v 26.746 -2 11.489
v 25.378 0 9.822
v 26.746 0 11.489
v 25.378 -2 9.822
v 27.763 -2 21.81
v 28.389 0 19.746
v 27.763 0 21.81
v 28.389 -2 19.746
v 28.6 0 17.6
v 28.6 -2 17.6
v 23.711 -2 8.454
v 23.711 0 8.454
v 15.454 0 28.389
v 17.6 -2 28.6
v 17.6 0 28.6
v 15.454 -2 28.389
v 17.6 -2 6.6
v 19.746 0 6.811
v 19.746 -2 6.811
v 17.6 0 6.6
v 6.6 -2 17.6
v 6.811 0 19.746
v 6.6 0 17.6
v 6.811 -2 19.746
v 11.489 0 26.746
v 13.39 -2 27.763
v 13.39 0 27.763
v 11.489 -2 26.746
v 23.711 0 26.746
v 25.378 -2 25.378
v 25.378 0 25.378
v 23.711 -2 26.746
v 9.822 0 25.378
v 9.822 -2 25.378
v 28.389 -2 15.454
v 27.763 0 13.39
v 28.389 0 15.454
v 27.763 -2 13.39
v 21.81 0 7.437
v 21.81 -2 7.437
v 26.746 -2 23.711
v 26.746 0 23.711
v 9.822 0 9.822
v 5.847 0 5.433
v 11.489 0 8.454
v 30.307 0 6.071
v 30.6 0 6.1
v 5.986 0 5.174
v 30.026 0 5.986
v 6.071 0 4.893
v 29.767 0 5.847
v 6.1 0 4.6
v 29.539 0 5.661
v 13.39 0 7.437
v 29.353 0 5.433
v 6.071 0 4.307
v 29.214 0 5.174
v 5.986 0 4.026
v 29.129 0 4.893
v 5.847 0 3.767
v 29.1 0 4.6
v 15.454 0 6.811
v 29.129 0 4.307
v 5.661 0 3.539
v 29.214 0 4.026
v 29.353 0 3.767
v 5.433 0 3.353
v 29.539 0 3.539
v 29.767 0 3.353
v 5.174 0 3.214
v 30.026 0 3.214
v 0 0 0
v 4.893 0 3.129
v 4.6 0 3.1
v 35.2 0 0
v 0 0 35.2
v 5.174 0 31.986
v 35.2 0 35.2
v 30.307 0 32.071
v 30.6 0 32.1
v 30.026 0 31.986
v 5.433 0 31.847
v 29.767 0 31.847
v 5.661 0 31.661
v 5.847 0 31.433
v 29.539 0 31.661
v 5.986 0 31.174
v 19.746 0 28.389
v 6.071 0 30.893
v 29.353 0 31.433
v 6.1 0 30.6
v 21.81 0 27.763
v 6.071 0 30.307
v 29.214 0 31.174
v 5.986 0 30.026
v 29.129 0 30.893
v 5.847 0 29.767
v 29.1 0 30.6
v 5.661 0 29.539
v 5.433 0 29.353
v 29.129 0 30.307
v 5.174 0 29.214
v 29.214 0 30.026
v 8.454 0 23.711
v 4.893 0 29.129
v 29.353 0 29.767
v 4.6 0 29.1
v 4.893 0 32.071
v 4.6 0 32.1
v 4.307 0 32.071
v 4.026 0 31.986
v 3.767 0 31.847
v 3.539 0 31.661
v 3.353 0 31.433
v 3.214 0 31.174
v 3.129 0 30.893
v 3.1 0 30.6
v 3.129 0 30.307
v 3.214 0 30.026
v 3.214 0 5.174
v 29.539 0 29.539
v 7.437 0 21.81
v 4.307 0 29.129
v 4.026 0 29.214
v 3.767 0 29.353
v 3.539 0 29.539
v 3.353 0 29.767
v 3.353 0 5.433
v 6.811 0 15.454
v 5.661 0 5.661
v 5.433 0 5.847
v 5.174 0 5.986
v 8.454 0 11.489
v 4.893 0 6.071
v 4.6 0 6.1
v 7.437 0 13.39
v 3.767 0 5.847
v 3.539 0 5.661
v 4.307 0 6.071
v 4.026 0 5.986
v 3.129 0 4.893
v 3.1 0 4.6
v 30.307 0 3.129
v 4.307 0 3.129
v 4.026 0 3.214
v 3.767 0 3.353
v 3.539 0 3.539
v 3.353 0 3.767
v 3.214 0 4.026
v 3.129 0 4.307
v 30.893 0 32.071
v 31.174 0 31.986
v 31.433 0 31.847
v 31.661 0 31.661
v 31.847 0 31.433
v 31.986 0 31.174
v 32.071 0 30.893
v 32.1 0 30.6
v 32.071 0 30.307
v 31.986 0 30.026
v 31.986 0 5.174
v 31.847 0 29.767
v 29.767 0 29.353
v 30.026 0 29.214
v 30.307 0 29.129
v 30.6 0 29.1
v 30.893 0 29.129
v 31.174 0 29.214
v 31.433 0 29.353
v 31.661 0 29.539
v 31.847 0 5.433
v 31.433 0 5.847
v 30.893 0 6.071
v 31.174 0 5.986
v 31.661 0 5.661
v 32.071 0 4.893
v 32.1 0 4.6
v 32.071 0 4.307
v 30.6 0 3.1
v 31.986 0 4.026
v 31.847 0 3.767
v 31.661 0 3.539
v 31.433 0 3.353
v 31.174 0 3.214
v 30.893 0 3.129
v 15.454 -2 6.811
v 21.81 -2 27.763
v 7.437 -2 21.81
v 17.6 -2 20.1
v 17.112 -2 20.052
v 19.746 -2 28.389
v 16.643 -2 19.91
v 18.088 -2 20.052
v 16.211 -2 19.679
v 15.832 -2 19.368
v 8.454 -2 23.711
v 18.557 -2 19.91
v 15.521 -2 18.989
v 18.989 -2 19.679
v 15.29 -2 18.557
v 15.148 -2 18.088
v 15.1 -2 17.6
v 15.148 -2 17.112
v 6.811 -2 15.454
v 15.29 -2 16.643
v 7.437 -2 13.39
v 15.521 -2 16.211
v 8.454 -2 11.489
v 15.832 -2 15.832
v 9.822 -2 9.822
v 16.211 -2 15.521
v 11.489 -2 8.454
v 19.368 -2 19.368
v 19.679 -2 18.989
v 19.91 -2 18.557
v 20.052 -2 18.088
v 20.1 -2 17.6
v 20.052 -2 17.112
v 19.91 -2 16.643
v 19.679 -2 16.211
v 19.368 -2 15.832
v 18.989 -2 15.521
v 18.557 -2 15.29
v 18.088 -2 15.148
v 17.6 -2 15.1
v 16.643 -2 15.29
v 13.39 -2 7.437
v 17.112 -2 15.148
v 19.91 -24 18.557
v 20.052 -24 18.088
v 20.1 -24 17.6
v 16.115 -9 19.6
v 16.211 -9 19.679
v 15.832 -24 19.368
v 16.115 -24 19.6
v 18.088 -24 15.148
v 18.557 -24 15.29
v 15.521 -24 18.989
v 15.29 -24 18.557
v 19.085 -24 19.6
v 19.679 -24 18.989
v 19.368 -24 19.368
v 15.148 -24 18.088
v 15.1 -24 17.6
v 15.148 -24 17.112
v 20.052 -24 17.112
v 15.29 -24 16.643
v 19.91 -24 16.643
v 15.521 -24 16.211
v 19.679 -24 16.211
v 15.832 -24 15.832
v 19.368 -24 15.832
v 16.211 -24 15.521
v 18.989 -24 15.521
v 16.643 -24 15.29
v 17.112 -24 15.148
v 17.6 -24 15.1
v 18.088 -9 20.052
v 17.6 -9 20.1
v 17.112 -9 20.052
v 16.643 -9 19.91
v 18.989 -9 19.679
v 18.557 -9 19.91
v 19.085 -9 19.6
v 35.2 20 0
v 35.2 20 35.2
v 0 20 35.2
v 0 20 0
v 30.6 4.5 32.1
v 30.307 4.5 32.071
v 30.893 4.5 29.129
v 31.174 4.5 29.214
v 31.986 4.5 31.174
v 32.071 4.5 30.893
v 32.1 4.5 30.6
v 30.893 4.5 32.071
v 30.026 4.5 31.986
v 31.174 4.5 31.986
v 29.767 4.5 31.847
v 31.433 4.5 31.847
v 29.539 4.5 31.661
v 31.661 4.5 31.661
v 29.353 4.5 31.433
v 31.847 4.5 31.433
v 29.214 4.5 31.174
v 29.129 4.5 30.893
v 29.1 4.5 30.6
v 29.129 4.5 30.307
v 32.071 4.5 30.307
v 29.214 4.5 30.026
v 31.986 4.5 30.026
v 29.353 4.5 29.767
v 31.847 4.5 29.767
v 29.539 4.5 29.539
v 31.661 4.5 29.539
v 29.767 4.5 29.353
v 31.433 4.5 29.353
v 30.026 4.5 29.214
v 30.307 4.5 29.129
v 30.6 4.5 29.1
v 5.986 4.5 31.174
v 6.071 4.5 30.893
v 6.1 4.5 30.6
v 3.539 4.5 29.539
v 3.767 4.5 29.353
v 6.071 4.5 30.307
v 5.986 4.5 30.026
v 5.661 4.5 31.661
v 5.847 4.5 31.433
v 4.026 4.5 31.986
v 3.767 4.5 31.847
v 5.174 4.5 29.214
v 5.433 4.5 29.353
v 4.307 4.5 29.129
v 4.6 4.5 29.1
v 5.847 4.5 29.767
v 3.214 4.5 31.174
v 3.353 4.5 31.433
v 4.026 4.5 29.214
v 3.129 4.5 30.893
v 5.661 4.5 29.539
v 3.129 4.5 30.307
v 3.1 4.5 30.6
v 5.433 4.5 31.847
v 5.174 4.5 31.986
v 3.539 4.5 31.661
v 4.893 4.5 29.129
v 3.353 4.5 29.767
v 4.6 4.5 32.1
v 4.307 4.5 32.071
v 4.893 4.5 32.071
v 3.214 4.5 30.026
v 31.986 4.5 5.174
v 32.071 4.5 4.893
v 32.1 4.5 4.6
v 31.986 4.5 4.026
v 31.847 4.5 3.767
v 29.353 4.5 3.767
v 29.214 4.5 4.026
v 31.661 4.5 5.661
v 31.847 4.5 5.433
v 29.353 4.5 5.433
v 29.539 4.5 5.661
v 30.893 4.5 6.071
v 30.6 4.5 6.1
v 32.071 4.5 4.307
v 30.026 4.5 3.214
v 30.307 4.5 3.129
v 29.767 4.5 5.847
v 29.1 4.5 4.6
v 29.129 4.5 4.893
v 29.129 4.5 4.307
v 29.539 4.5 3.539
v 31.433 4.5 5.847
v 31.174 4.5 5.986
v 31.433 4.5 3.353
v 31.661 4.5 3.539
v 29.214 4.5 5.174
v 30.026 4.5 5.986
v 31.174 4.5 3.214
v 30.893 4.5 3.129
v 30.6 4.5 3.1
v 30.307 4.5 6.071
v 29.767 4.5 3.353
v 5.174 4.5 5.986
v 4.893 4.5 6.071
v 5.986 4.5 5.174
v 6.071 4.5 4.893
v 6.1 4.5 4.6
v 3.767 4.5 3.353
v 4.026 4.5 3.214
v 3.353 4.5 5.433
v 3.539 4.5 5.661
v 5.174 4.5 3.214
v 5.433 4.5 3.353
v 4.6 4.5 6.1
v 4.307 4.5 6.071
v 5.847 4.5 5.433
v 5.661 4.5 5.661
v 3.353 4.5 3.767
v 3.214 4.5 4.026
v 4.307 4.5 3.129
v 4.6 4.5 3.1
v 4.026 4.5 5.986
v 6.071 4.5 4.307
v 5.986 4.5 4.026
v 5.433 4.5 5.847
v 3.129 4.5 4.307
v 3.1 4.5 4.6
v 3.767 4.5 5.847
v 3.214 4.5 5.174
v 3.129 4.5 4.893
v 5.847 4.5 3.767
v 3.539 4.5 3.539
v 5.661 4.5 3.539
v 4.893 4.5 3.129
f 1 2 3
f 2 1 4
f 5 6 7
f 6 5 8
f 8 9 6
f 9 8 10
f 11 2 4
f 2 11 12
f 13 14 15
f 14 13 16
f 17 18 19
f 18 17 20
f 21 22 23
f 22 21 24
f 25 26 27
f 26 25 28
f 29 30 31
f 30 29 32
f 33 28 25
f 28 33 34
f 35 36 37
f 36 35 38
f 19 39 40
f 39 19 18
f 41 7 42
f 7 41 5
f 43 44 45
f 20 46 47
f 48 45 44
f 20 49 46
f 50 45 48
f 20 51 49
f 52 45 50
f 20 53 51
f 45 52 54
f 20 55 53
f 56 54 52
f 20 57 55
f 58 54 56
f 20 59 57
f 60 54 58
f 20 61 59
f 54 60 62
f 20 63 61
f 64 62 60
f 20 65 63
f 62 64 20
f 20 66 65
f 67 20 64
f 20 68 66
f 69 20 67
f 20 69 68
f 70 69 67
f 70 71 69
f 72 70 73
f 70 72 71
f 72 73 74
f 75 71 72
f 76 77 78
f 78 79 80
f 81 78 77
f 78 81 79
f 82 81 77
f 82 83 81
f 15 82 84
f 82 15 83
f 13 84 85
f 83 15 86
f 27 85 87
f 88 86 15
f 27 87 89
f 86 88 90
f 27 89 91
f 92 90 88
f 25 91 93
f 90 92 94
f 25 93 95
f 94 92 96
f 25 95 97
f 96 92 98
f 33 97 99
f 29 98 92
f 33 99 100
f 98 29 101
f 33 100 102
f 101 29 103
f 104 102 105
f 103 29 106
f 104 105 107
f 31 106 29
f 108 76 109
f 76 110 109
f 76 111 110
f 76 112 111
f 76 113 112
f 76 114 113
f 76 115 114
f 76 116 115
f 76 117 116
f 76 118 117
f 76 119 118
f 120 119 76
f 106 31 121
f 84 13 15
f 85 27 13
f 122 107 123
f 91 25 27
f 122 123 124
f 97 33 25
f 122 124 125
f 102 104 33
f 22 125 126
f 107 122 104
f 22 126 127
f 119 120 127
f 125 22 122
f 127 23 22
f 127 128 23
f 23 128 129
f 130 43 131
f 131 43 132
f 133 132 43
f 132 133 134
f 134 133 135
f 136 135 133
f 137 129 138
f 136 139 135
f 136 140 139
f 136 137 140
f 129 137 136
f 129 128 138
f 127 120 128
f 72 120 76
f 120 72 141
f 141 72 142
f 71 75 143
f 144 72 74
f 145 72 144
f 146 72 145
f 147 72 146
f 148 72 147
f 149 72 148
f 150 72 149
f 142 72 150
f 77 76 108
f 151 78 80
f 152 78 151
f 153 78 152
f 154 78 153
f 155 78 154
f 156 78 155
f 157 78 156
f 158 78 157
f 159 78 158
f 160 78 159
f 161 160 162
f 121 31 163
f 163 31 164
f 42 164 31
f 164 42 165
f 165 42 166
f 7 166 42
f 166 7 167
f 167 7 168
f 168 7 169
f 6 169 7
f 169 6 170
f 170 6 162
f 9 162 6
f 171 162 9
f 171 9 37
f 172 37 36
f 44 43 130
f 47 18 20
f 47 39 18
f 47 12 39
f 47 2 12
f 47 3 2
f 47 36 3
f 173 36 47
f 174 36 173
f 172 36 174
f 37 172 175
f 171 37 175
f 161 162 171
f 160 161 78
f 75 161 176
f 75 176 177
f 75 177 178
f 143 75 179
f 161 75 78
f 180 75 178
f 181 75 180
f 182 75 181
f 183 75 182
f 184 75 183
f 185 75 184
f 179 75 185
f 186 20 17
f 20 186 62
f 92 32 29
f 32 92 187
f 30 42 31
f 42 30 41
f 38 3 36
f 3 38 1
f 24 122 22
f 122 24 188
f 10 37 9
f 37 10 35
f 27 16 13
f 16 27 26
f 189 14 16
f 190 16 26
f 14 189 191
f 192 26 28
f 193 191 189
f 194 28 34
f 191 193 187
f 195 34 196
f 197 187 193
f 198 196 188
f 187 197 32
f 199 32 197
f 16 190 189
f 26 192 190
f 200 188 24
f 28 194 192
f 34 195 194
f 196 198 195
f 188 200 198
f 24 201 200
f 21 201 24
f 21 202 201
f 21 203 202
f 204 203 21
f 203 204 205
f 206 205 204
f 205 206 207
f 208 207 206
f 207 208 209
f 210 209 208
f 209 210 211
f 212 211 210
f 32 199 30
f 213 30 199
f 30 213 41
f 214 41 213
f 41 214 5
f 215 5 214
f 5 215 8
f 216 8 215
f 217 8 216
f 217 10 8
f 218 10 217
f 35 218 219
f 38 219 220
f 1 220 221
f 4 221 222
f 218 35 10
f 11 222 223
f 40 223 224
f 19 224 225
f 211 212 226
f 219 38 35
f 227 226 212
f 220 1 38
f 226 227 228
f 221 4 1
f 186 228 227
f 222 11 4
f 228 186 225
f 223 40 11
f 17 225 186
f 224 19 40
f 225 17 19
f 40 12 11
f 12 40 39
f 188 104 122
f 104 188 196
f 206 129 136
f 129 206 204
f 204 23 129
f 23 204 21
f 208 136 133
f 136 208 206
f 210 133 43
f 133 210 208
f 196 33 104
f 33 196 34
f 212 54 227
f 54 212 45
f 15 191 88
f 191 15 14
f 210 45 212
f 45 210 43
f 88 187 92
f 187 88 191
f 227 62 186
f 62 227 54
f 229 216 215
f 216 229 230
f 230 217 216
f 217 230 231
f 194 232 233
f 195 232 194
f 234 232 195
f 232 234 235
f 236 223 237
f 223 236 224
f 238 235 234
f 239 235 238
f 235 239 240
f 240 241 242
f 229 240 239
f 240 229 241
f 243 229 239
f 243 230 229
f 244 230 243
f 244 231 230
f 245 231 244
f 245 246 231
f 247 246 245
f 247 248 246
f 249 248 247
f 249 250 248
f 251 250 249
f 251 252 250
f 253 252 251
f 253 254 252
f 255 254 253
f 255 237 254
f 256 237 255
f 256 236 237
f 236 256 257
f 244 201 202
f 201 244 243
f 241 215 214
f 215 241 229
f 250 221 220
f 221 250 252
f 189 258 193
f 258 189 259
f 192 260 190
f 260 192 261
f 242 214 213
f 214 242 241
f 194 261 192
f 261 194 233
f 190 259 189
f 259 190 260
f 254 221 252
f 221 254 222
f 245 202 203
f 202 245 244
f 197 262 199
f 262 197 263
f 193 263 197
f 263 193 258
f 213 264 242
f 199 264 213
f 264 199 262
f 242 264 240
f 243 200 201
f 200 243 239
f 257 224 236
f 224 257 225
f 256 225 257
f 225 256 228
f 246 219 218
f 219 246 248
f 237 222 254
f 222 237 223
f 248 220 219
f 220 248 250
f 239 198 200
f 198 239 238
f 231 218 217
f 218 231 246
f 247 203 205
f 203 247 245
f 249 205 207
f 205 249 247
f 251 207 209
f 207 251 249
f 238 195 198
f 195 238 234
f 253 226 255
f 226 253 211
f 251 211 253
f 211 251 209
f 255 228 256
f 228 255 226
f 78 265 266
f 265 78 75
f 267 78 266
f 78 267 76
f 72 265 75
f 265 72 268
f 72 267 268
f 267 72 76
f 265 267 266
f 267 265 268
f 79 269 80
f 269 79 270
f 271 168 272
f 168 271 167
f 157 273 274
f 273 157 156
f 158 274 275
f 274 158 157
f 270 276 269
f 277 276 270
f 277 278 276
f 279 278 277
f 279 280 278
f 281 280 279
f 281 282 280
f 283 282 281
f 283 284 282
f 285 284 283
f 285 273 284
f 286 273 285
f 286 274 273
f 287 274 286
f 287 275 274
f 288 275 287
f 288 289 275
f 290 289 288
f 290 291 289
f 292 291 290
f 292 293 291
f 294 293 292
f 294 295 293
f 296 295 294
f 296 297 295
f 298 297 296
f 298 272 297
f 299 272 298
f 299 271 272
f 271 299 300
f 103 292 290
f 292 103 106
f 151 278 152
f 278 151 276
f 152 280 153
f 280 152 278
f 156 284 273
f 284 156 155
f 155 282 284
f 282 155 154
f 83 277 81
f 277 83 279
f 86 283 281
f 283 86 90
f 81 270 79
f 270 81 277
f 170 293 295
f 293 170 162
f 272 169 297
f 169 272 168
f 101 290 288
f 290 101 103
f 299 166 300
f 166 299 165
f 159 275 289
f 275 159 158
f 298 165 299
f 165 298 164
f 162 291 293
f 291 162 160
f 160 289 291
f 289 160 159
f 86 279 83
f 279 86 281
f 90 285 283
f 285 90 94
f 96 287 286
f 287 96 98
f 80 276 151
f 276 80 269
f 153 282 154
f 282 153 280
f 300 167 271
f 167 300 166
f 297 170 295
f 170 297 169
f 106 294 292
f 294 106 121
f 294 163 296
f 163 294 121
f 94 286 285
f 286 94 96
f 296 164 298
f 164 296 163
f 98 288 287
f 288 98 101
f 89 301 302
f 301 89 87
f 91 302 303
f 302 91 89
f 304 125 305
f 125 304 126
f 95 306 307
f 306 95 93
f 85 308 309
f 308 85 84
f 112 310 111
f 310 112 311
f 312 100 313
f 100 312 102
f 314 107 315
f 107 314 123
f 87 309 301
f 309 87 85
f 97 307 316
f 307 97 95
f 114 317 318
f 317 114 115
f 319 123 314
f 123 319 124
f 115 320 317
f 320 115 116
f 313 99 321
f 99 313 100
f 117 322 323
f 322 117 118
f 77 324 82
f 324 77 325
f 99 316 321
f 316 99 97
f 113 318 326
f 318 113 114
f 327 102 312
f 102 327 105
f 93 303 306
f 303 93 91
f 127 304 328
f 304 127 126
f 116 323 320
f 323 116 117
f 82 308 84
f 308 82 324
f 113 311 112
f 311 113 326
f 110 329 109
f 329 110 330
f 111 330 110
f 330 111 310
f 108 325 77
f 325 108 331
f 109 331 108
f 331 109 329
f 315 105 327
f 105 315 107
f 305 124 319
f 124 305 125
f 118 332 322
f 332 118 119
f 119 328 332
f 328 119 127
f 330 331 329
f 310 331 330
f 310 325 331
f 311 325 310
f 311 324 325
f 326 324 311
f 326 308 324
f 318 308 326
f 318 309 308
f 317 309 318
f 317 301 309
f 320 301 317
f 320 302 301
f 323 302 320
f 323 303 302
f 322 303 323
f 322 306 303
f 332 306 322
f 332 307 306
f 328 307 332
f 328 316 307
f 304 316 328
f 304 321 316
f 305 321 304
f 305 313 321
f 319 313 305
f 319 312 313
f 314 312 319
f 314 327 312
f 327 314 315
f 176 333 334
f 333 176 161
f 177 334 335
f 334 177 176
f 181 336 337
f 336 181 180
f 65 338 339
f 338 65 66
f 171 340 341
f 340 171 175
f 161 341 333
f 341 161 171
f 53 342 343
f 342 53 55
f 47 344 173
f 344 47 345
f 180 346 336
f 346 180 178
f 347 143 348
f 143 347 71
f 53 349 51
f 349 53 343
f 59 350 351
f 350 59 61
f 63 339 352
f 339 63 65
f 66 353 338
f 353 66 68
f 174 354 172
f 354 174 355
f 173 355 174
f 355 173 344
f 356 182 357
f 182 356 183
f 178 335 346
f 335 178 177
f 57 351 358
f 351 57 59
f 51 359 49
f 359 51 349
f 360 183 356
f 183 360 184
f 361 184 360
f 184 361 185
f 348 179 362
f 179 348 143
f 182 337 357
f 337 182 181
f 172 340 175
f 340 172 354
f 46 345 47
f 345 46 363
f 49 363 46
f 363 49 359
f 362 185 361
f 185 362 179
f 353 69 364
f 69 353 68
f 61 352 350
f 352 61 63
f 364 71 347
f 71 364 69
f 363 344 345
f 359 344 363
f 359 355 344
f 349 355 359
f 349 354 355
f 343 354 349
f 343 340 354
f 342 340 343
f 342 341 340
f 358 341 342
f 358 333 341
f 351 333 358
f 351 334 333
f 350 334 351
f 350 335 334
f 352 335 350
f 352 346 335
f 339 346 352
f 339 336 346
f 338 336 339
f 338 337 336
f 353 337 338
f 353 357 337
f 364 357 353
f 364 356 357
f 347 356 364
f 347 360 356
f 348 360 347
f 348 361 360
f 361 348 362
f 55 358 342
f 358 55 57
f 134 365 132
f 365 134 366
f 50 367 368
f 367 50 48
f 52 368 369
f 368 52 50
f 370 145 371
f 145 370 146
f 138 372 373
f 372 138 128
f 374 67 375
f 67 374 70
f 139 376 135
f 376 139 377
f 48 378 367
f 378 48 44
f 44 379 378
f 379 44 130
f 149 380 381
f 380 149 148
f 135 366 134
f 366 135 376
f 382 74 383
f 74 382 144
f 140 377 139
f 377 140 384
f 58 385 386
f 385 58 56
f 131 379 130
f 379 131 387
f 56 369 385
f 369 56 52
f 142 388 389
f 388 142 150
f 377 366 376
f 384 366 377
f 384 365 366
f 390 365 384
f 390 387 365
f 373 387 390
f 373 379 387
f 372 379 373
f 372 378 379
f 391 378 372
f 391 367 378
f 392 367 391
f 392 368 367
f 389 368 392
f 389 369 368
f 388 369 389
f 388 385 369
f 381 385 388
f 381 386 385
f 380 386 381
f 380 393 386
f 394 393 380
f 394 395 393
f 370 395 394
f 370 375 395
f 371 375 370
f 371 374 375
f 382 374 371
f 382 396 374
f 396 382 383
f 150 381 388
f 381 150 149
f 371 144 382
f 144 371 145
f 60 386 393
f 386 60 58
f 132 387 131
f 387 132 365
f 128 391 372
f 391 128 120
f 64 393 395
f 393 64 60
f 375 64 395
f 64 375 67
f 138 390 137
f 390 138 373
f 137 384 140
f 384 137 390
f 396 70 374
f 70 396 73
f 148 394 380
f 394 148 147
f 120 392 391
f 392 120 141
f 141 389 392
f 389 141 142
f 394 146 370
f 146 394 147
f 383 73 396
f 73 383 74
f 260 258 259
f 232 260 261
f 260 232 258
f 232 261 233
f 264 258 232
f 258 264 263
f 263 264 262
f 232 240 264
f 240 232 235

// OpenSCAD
// WeePrusa
// Stepper Motors
// GNU GPL v3
// Thomas Phillips (tntexplosivesltd@gmail.com)
// https://github.com/tntexplosivesltd/WeePrusa

$fn = 32;

// Colours
black = [12/255, 12/255, 12/255];
grey = [200/255, 200/255, 200/255];

// Motor back
width = 35.2;
torque = 4;

// Shaft
shaft = 24;
shaft_radius = 2.5;
keyway = 15;
hub_radius = 11;
hub_width = 2;

// Screws
screw_size = 3;
screw_depth = 4.5;
screw_separation = 26;

function get_length(t) = lookup(t, [
			[4, 20],
			[6.5, 26],
			[7, 28],
			[12.5, 28],
			[10, 26],
			[14, 26],
			[18, 34],
			[18.5, 41],
			[23, 42],
			[40, 52],
	]);

length = get_length(torque);

difference()
{
	union()
	{
		color (black) cube ([width, length, width], center = false);
		color (grey)
		{
			translate ([width/2, 0, width/2])
			{
				rotate ([90,0,0]) cylinder (h = hub_width, r1 = hub_radius, r2 = hub_radius, center = false);
				rotate ([90,0,0]) cylinder (h = shaft, r1 = shaft_radius, r2 = shaft_radius, center = false);
			}
		}
	}
	
	color (grey)
	{
		translate([width/2, screw_depth, width/2])
		{
			// screw holes
			translate ([screw_separation/2, 0, screw_separation/2]) rotate ([90,0,0])
				cylinder (h = screw_depth+1, r1 = screw_size/2, r2 = screw_size/2, center = false);
			translate ([-screw_separation/2, 0, screw_separation/2]) rotate ([90,0,0])
				cylinder (h = screw_depth+1, r1 = screw_size/2, r2 = screw_size/2, center = false);
			translate ([screw_separation/2, 0, -screw_separation/2]) rotate ([90,0,0])
				cylinder (h = screw_depth+1, r1 = screw_size/2, r2 = screw_size/2, center = false);
			translate ([-screw_separation/2, 0, -screw_separation/2]) rotate ([90,0,0])
				cylinder (h = screw_depth+1, r1 = screw_size/2, r2 = screw_size/2, center = false);

			// flat on shaft
			rotate ([90,0,0]) translate ([-shaft_radius, shaft_radius-0.5, shaft+screw_depth-keyway]) 
				cube ([5, 0.5, keyway+1], center = false);
		}
	}
}
